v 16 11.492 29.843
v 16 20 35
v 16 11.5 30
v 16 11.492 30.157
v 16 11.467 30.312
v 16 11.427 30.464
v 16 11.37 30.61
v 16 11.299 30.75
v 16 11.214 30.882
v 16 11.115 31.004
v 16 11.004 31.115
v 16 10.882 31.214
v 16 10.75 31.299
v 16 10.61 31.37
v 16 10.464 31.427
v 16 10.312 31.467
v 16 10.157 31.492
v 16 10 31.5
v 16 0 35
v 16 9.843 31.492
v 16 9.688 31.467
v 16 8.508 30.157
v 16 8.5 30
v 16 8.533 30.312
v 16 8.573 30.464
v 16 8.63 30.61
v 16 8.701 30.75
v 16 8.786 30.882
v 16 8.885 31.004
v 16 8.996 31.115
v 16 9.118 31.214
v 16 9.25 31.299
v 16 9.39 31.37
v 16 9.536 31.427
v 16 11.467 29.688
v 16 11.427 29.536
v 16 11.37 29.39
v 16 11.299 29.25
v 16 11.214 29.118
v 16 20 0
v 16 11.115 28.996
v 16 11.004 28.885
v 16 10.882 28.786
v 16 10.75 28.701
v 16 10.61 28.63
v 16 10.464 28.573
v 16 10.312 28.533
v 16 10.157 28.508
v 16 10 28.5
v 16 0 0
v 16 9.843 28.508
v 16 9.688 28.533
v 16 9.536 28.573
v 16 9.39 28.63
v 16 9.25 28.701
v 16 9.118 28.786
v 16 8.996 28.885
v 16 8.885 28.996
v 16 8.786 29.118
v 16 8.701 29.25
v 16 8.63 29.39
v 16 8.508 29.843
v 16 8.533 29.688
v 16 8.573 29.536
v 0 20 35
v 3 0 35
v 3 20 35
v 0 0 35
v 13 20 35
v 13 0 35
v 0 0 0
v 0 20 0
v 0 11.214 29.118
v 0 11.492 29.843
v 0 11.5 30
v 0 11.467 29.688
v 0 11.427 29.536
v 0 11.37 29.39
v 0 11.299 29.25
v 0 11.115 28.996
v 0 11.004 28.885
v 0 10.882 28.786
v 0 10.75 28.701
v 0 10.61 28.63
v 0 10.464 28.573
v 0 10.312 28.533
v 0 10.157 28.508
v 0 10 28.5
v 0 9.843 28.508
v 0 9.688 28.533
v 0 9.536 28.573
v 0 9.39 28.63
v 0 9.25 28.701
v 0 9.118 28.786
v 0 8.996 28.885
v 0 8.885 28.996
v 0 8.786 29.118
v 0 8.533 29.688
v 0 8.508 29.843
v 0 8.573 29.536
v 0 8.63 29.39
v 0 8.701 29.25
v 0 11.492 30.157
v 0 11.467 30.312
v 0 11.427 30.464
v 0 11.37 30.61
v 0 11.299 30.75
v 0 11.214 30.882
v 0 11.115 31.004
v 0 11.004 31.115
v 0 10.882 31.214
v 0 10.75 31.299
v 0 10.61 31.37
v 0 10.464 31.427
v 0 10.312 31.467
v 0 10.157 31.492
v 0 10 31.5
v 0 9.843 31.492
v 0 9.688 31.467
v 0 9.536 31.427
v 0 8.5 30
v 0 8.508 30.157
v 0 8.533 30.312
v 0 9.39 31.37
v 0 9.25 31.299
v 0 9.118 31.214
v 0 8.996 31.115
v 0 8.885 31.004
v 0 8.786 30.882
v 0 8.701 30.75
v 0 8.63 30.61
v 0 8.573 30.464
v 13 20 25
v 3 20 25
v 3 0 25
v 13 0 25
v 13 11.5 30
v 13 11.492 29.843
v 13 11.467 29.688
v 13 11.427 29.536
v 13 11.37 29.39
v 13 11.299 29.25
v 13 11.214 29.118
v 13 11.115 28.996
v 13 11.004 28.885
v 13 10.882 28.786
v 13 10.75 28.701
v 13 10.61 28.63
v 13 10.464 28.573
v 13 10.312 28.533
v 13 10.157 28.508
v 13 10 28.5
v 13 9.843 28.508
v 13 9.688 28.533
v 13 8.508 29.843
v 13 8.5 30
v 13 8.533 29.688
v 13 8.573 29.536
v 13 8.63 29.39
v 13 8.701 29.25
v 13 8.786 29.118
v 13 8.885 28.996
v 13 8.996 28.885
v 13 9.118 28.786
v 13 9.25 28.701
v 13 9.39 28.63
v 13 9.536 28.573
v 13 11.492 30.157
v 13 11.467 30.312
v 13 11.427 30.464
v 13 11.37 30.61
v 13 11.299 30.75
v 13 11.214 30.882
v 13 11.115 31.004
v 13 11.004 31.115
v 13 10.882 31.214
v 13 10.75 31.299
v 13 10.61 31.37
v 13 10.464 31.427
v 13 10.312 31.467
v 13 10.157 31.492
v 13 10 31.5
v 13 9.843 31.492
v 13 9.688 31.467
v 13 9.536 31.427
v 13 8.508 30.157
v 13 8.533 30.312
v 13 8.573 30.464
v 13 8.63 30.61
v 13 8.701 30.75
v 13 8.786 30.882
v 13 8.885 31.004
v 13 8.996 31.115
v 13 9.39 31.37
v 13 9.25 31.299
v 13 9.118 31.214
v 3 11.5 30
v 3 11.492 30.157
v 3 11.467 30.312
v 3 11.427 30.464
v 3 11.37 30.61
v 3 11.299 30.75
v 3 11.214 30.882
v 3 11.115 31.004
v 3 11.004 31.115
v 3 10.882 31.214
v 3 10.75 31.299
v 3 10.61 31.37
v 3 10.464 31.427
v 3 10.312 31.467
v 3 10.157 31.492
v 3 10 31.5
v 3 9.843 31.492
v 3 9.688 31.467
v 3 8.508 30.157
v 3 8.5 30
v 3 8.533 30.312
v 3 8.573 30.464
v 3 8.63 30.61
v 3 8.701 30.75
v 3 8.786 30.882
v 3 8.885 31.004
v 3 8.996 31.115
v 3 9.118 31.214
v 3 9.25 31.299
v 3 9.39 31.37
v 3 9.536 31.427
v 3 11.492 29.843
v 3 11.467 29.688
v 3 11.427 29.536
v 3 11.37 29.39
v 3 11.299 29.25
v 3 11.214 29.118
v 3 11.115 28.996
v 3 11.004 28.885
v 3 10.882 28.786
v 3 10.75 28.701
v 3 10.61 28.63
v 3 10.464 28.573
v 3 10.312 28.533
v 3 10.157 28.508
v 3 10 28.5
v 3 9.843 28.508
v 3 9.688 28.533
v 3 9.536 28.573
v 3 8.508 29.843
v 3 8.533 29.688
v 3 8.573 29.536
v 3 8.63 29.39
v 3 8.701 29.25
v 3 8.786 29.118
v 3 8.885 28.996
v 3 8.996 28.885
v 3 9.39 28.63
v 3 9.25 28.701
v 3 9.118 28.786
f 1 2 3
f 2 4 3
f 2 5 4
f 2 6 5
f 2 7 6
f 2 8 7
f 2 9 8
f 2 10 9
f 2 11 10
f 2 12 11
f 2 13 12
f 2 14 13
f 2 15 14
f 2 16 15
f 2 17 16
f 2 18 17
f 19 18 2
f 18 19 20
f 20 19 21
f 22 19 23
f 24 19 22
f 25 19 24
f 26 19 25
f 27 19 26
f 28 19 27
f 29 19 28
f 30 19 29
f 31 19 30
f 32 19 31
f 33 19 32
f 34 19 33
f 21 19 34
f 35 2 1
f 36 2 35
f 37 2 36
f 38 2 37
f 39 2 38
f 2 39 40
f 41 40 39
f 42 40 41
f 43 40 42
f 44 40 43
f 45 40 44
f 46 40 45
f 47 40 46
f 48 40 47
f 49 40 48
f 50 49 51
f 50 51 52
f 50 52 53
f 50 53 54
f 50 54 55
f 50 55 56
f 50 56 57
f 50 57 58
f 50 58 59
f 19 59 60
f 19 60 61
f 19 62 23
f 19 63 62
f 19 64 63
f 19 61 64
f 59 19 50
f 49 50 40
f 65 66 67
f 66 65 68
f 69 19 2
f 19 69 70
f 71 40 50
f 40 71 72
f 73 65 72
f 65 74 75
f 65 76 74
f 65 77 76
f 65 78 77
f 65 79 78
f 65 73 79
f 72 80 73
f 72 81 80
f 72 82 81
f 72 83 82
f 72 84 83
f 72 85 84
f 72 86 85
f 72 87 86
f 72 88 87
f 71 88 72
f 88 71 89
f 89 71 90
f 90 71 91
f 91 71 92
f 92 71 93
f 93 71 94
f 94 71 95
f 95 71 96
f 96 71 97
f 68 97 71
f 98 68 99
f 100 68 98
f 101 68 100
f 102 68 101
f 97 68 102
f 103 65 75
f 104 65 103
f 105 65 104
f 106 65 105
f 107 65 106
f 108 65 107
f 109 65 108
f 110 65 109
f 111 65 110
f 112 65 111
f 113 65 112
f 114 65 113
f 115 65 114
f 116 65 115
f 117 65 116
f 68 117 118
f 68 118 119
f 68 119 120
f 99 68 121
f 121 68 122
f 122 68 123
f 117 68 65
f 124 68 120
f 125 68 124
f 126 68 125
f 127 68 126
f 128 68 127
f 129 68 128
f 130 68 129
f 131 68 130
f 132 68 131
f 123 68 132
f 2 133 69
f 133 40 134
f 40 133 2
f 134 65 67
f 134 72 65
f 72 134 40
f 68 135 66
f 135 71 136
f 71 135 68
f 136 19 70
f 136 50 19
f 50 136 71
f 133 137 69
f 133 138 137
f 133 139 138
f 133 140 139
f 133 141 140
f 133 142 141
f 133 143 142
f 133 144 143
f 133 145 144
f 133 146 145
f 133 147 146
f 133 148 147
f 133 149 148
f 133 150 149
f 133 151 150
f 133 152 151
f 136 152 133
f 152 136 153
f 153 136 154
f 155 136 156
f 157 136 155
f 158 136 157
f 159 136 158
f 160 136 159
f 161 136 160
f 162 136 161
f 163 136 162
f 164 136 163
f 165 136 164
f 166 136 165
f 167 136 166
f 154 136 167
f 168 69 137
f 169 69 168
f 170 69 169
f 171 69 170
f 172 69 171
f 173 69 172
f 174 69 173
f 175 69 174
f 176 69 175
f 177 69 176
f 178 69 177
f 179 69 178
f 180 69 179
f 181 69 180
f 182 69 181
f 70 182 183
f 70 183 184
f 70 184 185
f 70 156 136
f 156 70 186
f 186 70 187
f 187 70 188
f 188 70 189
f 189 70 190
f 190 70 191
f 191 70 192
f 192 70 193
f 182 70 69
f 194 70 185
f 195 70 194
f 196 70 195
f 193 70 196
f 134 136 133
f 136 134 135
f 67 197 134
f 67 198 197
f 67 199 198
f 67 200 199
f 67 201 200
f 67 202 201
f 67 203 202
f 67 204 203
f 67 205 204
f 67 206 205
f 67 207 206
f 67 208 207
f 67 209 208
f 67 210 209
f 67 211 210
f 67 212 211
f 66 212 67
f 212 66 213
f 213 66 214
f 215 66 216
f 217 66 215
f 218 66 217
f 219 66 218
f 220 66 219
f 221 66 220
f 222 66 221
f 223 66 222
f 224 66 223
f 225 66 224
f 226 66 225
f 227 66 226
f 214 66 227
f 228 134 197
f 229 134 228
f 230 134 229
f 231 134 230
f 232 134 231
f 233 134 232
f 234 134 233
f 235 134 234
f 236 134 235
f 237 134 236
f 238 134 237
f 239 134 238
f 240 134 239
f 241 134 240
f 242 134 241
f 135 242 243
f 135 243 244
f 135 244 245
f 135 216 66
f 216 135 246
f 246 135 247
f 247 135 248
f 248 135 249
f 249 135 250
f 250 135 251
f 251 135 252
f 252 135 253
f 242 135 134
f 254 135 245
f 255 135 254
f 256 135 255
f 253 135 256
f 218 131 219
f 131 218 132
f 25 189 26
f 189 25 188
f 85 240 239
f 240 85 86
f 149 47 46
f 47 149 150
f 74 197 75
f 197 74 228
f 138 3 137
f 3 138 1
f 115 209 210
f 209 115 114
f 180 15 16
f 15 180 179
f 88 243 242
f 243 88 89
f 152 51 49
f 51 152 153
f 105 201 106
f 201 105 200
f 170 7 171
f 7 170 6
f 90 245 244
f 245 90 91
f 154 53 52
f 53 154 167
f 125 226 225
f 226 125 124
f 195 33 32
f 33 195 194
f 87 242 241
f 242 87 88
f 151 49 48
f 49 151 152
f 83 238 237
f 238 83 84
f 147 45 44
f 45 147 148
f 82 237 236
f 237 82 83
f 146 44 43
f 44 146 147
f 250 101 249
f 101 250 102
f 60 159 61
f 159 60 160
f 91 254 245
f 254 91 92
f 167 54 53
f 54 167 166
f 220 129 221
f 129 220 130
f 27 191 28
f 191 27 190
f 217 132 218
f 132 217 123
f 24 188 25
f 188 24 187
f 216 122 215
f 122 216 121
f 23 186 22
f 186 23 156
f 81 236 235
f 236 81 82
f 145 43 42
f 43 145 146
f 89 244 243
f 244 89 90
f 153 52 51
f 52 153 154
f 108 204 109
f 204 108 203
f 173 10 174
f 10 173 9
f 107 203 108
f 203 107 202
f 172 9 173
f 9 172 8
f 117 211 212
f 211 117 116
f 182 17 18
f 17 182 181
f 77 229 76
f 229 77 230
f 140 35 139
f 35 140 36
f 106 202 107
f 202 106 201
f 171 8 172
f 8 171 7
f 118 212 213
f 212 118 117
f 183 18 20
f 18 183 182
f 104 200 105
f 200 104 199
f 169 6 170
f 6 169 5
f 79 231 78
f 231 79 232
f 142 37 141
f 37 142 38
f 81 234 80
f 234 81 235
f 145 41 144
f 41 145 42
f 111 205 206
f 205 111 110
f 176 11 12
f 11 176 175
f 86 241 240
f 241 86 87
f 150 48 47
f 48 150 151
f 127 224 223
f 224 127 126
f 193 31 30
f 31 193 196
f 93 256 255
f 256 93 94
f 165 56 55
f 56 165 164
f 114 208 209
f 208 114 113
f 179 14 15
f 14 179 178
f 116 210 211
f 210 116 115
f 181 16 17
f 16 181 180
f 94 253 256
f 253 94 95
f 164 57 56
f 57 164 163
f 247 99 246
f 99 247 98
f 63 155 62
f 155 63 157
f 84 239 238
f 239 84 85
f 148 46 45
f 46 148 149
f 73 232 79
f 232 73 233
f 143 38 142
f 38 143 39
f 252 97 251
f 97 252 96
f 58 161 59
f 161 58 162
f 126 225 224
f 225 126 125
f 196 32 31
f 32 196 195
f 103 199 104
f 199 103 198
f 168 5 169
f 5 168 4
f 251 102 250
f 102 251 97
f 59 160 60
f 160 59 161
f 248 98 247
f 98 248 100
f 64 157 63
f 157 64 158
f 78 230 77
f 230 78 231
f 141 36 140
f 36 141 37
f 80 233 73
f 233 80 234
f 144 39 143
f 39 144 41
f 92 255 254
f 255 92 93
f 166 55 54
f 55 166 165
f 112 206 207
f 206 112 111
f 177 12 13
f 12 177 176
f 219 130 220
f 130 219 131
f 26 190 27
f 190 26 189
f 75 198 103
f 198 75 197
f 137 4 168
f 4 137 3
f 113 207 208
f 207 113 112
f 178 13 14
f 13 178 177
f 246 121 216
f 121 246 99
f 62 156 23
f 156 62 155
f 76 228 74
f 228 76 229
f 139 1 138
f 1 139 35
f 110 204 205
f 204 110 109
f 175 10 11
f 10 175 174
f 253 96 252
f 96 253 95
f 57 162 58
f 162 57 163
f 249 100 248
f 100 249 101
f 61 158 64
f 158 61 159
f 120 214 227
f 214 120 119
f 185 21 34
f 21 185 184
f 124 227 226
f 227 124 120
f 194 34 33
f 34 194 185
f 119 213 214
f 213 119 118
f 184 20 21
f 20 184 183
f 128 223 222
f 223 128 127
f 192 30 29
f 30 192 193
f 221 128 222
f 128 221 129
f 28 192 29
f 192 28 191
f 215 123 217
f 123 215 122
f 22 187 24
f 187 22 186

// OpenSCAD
// AeroMesh S3 - 35mm Elevated TPU Landing Skid
// Material: TPU (Flexible 95A)
// Mount: Mark4 Motor Arm Extrusion

$fn = 60;

skid_height = 35;
arm_width = 16;
arm_length = 20;
wall_thickness = 3;

difference() {
    // Outer landing foot body
    cube([arm_width, arm_length, skid_height], center = false);

    // Motor arm slot
    translate([wall_thickness, -1, skid_height - 10])
        cube([arm_width - (2 * wall_thickness), arm_length + 2, 11], center = false);

    // Zip-tie fastening channel
    translate([-1, arm_length / 2, skid_height - 5])
        rotate([0, 90, 0])
        cylinder(h = arm_width + 2, r = 1.5, center = false);
}
